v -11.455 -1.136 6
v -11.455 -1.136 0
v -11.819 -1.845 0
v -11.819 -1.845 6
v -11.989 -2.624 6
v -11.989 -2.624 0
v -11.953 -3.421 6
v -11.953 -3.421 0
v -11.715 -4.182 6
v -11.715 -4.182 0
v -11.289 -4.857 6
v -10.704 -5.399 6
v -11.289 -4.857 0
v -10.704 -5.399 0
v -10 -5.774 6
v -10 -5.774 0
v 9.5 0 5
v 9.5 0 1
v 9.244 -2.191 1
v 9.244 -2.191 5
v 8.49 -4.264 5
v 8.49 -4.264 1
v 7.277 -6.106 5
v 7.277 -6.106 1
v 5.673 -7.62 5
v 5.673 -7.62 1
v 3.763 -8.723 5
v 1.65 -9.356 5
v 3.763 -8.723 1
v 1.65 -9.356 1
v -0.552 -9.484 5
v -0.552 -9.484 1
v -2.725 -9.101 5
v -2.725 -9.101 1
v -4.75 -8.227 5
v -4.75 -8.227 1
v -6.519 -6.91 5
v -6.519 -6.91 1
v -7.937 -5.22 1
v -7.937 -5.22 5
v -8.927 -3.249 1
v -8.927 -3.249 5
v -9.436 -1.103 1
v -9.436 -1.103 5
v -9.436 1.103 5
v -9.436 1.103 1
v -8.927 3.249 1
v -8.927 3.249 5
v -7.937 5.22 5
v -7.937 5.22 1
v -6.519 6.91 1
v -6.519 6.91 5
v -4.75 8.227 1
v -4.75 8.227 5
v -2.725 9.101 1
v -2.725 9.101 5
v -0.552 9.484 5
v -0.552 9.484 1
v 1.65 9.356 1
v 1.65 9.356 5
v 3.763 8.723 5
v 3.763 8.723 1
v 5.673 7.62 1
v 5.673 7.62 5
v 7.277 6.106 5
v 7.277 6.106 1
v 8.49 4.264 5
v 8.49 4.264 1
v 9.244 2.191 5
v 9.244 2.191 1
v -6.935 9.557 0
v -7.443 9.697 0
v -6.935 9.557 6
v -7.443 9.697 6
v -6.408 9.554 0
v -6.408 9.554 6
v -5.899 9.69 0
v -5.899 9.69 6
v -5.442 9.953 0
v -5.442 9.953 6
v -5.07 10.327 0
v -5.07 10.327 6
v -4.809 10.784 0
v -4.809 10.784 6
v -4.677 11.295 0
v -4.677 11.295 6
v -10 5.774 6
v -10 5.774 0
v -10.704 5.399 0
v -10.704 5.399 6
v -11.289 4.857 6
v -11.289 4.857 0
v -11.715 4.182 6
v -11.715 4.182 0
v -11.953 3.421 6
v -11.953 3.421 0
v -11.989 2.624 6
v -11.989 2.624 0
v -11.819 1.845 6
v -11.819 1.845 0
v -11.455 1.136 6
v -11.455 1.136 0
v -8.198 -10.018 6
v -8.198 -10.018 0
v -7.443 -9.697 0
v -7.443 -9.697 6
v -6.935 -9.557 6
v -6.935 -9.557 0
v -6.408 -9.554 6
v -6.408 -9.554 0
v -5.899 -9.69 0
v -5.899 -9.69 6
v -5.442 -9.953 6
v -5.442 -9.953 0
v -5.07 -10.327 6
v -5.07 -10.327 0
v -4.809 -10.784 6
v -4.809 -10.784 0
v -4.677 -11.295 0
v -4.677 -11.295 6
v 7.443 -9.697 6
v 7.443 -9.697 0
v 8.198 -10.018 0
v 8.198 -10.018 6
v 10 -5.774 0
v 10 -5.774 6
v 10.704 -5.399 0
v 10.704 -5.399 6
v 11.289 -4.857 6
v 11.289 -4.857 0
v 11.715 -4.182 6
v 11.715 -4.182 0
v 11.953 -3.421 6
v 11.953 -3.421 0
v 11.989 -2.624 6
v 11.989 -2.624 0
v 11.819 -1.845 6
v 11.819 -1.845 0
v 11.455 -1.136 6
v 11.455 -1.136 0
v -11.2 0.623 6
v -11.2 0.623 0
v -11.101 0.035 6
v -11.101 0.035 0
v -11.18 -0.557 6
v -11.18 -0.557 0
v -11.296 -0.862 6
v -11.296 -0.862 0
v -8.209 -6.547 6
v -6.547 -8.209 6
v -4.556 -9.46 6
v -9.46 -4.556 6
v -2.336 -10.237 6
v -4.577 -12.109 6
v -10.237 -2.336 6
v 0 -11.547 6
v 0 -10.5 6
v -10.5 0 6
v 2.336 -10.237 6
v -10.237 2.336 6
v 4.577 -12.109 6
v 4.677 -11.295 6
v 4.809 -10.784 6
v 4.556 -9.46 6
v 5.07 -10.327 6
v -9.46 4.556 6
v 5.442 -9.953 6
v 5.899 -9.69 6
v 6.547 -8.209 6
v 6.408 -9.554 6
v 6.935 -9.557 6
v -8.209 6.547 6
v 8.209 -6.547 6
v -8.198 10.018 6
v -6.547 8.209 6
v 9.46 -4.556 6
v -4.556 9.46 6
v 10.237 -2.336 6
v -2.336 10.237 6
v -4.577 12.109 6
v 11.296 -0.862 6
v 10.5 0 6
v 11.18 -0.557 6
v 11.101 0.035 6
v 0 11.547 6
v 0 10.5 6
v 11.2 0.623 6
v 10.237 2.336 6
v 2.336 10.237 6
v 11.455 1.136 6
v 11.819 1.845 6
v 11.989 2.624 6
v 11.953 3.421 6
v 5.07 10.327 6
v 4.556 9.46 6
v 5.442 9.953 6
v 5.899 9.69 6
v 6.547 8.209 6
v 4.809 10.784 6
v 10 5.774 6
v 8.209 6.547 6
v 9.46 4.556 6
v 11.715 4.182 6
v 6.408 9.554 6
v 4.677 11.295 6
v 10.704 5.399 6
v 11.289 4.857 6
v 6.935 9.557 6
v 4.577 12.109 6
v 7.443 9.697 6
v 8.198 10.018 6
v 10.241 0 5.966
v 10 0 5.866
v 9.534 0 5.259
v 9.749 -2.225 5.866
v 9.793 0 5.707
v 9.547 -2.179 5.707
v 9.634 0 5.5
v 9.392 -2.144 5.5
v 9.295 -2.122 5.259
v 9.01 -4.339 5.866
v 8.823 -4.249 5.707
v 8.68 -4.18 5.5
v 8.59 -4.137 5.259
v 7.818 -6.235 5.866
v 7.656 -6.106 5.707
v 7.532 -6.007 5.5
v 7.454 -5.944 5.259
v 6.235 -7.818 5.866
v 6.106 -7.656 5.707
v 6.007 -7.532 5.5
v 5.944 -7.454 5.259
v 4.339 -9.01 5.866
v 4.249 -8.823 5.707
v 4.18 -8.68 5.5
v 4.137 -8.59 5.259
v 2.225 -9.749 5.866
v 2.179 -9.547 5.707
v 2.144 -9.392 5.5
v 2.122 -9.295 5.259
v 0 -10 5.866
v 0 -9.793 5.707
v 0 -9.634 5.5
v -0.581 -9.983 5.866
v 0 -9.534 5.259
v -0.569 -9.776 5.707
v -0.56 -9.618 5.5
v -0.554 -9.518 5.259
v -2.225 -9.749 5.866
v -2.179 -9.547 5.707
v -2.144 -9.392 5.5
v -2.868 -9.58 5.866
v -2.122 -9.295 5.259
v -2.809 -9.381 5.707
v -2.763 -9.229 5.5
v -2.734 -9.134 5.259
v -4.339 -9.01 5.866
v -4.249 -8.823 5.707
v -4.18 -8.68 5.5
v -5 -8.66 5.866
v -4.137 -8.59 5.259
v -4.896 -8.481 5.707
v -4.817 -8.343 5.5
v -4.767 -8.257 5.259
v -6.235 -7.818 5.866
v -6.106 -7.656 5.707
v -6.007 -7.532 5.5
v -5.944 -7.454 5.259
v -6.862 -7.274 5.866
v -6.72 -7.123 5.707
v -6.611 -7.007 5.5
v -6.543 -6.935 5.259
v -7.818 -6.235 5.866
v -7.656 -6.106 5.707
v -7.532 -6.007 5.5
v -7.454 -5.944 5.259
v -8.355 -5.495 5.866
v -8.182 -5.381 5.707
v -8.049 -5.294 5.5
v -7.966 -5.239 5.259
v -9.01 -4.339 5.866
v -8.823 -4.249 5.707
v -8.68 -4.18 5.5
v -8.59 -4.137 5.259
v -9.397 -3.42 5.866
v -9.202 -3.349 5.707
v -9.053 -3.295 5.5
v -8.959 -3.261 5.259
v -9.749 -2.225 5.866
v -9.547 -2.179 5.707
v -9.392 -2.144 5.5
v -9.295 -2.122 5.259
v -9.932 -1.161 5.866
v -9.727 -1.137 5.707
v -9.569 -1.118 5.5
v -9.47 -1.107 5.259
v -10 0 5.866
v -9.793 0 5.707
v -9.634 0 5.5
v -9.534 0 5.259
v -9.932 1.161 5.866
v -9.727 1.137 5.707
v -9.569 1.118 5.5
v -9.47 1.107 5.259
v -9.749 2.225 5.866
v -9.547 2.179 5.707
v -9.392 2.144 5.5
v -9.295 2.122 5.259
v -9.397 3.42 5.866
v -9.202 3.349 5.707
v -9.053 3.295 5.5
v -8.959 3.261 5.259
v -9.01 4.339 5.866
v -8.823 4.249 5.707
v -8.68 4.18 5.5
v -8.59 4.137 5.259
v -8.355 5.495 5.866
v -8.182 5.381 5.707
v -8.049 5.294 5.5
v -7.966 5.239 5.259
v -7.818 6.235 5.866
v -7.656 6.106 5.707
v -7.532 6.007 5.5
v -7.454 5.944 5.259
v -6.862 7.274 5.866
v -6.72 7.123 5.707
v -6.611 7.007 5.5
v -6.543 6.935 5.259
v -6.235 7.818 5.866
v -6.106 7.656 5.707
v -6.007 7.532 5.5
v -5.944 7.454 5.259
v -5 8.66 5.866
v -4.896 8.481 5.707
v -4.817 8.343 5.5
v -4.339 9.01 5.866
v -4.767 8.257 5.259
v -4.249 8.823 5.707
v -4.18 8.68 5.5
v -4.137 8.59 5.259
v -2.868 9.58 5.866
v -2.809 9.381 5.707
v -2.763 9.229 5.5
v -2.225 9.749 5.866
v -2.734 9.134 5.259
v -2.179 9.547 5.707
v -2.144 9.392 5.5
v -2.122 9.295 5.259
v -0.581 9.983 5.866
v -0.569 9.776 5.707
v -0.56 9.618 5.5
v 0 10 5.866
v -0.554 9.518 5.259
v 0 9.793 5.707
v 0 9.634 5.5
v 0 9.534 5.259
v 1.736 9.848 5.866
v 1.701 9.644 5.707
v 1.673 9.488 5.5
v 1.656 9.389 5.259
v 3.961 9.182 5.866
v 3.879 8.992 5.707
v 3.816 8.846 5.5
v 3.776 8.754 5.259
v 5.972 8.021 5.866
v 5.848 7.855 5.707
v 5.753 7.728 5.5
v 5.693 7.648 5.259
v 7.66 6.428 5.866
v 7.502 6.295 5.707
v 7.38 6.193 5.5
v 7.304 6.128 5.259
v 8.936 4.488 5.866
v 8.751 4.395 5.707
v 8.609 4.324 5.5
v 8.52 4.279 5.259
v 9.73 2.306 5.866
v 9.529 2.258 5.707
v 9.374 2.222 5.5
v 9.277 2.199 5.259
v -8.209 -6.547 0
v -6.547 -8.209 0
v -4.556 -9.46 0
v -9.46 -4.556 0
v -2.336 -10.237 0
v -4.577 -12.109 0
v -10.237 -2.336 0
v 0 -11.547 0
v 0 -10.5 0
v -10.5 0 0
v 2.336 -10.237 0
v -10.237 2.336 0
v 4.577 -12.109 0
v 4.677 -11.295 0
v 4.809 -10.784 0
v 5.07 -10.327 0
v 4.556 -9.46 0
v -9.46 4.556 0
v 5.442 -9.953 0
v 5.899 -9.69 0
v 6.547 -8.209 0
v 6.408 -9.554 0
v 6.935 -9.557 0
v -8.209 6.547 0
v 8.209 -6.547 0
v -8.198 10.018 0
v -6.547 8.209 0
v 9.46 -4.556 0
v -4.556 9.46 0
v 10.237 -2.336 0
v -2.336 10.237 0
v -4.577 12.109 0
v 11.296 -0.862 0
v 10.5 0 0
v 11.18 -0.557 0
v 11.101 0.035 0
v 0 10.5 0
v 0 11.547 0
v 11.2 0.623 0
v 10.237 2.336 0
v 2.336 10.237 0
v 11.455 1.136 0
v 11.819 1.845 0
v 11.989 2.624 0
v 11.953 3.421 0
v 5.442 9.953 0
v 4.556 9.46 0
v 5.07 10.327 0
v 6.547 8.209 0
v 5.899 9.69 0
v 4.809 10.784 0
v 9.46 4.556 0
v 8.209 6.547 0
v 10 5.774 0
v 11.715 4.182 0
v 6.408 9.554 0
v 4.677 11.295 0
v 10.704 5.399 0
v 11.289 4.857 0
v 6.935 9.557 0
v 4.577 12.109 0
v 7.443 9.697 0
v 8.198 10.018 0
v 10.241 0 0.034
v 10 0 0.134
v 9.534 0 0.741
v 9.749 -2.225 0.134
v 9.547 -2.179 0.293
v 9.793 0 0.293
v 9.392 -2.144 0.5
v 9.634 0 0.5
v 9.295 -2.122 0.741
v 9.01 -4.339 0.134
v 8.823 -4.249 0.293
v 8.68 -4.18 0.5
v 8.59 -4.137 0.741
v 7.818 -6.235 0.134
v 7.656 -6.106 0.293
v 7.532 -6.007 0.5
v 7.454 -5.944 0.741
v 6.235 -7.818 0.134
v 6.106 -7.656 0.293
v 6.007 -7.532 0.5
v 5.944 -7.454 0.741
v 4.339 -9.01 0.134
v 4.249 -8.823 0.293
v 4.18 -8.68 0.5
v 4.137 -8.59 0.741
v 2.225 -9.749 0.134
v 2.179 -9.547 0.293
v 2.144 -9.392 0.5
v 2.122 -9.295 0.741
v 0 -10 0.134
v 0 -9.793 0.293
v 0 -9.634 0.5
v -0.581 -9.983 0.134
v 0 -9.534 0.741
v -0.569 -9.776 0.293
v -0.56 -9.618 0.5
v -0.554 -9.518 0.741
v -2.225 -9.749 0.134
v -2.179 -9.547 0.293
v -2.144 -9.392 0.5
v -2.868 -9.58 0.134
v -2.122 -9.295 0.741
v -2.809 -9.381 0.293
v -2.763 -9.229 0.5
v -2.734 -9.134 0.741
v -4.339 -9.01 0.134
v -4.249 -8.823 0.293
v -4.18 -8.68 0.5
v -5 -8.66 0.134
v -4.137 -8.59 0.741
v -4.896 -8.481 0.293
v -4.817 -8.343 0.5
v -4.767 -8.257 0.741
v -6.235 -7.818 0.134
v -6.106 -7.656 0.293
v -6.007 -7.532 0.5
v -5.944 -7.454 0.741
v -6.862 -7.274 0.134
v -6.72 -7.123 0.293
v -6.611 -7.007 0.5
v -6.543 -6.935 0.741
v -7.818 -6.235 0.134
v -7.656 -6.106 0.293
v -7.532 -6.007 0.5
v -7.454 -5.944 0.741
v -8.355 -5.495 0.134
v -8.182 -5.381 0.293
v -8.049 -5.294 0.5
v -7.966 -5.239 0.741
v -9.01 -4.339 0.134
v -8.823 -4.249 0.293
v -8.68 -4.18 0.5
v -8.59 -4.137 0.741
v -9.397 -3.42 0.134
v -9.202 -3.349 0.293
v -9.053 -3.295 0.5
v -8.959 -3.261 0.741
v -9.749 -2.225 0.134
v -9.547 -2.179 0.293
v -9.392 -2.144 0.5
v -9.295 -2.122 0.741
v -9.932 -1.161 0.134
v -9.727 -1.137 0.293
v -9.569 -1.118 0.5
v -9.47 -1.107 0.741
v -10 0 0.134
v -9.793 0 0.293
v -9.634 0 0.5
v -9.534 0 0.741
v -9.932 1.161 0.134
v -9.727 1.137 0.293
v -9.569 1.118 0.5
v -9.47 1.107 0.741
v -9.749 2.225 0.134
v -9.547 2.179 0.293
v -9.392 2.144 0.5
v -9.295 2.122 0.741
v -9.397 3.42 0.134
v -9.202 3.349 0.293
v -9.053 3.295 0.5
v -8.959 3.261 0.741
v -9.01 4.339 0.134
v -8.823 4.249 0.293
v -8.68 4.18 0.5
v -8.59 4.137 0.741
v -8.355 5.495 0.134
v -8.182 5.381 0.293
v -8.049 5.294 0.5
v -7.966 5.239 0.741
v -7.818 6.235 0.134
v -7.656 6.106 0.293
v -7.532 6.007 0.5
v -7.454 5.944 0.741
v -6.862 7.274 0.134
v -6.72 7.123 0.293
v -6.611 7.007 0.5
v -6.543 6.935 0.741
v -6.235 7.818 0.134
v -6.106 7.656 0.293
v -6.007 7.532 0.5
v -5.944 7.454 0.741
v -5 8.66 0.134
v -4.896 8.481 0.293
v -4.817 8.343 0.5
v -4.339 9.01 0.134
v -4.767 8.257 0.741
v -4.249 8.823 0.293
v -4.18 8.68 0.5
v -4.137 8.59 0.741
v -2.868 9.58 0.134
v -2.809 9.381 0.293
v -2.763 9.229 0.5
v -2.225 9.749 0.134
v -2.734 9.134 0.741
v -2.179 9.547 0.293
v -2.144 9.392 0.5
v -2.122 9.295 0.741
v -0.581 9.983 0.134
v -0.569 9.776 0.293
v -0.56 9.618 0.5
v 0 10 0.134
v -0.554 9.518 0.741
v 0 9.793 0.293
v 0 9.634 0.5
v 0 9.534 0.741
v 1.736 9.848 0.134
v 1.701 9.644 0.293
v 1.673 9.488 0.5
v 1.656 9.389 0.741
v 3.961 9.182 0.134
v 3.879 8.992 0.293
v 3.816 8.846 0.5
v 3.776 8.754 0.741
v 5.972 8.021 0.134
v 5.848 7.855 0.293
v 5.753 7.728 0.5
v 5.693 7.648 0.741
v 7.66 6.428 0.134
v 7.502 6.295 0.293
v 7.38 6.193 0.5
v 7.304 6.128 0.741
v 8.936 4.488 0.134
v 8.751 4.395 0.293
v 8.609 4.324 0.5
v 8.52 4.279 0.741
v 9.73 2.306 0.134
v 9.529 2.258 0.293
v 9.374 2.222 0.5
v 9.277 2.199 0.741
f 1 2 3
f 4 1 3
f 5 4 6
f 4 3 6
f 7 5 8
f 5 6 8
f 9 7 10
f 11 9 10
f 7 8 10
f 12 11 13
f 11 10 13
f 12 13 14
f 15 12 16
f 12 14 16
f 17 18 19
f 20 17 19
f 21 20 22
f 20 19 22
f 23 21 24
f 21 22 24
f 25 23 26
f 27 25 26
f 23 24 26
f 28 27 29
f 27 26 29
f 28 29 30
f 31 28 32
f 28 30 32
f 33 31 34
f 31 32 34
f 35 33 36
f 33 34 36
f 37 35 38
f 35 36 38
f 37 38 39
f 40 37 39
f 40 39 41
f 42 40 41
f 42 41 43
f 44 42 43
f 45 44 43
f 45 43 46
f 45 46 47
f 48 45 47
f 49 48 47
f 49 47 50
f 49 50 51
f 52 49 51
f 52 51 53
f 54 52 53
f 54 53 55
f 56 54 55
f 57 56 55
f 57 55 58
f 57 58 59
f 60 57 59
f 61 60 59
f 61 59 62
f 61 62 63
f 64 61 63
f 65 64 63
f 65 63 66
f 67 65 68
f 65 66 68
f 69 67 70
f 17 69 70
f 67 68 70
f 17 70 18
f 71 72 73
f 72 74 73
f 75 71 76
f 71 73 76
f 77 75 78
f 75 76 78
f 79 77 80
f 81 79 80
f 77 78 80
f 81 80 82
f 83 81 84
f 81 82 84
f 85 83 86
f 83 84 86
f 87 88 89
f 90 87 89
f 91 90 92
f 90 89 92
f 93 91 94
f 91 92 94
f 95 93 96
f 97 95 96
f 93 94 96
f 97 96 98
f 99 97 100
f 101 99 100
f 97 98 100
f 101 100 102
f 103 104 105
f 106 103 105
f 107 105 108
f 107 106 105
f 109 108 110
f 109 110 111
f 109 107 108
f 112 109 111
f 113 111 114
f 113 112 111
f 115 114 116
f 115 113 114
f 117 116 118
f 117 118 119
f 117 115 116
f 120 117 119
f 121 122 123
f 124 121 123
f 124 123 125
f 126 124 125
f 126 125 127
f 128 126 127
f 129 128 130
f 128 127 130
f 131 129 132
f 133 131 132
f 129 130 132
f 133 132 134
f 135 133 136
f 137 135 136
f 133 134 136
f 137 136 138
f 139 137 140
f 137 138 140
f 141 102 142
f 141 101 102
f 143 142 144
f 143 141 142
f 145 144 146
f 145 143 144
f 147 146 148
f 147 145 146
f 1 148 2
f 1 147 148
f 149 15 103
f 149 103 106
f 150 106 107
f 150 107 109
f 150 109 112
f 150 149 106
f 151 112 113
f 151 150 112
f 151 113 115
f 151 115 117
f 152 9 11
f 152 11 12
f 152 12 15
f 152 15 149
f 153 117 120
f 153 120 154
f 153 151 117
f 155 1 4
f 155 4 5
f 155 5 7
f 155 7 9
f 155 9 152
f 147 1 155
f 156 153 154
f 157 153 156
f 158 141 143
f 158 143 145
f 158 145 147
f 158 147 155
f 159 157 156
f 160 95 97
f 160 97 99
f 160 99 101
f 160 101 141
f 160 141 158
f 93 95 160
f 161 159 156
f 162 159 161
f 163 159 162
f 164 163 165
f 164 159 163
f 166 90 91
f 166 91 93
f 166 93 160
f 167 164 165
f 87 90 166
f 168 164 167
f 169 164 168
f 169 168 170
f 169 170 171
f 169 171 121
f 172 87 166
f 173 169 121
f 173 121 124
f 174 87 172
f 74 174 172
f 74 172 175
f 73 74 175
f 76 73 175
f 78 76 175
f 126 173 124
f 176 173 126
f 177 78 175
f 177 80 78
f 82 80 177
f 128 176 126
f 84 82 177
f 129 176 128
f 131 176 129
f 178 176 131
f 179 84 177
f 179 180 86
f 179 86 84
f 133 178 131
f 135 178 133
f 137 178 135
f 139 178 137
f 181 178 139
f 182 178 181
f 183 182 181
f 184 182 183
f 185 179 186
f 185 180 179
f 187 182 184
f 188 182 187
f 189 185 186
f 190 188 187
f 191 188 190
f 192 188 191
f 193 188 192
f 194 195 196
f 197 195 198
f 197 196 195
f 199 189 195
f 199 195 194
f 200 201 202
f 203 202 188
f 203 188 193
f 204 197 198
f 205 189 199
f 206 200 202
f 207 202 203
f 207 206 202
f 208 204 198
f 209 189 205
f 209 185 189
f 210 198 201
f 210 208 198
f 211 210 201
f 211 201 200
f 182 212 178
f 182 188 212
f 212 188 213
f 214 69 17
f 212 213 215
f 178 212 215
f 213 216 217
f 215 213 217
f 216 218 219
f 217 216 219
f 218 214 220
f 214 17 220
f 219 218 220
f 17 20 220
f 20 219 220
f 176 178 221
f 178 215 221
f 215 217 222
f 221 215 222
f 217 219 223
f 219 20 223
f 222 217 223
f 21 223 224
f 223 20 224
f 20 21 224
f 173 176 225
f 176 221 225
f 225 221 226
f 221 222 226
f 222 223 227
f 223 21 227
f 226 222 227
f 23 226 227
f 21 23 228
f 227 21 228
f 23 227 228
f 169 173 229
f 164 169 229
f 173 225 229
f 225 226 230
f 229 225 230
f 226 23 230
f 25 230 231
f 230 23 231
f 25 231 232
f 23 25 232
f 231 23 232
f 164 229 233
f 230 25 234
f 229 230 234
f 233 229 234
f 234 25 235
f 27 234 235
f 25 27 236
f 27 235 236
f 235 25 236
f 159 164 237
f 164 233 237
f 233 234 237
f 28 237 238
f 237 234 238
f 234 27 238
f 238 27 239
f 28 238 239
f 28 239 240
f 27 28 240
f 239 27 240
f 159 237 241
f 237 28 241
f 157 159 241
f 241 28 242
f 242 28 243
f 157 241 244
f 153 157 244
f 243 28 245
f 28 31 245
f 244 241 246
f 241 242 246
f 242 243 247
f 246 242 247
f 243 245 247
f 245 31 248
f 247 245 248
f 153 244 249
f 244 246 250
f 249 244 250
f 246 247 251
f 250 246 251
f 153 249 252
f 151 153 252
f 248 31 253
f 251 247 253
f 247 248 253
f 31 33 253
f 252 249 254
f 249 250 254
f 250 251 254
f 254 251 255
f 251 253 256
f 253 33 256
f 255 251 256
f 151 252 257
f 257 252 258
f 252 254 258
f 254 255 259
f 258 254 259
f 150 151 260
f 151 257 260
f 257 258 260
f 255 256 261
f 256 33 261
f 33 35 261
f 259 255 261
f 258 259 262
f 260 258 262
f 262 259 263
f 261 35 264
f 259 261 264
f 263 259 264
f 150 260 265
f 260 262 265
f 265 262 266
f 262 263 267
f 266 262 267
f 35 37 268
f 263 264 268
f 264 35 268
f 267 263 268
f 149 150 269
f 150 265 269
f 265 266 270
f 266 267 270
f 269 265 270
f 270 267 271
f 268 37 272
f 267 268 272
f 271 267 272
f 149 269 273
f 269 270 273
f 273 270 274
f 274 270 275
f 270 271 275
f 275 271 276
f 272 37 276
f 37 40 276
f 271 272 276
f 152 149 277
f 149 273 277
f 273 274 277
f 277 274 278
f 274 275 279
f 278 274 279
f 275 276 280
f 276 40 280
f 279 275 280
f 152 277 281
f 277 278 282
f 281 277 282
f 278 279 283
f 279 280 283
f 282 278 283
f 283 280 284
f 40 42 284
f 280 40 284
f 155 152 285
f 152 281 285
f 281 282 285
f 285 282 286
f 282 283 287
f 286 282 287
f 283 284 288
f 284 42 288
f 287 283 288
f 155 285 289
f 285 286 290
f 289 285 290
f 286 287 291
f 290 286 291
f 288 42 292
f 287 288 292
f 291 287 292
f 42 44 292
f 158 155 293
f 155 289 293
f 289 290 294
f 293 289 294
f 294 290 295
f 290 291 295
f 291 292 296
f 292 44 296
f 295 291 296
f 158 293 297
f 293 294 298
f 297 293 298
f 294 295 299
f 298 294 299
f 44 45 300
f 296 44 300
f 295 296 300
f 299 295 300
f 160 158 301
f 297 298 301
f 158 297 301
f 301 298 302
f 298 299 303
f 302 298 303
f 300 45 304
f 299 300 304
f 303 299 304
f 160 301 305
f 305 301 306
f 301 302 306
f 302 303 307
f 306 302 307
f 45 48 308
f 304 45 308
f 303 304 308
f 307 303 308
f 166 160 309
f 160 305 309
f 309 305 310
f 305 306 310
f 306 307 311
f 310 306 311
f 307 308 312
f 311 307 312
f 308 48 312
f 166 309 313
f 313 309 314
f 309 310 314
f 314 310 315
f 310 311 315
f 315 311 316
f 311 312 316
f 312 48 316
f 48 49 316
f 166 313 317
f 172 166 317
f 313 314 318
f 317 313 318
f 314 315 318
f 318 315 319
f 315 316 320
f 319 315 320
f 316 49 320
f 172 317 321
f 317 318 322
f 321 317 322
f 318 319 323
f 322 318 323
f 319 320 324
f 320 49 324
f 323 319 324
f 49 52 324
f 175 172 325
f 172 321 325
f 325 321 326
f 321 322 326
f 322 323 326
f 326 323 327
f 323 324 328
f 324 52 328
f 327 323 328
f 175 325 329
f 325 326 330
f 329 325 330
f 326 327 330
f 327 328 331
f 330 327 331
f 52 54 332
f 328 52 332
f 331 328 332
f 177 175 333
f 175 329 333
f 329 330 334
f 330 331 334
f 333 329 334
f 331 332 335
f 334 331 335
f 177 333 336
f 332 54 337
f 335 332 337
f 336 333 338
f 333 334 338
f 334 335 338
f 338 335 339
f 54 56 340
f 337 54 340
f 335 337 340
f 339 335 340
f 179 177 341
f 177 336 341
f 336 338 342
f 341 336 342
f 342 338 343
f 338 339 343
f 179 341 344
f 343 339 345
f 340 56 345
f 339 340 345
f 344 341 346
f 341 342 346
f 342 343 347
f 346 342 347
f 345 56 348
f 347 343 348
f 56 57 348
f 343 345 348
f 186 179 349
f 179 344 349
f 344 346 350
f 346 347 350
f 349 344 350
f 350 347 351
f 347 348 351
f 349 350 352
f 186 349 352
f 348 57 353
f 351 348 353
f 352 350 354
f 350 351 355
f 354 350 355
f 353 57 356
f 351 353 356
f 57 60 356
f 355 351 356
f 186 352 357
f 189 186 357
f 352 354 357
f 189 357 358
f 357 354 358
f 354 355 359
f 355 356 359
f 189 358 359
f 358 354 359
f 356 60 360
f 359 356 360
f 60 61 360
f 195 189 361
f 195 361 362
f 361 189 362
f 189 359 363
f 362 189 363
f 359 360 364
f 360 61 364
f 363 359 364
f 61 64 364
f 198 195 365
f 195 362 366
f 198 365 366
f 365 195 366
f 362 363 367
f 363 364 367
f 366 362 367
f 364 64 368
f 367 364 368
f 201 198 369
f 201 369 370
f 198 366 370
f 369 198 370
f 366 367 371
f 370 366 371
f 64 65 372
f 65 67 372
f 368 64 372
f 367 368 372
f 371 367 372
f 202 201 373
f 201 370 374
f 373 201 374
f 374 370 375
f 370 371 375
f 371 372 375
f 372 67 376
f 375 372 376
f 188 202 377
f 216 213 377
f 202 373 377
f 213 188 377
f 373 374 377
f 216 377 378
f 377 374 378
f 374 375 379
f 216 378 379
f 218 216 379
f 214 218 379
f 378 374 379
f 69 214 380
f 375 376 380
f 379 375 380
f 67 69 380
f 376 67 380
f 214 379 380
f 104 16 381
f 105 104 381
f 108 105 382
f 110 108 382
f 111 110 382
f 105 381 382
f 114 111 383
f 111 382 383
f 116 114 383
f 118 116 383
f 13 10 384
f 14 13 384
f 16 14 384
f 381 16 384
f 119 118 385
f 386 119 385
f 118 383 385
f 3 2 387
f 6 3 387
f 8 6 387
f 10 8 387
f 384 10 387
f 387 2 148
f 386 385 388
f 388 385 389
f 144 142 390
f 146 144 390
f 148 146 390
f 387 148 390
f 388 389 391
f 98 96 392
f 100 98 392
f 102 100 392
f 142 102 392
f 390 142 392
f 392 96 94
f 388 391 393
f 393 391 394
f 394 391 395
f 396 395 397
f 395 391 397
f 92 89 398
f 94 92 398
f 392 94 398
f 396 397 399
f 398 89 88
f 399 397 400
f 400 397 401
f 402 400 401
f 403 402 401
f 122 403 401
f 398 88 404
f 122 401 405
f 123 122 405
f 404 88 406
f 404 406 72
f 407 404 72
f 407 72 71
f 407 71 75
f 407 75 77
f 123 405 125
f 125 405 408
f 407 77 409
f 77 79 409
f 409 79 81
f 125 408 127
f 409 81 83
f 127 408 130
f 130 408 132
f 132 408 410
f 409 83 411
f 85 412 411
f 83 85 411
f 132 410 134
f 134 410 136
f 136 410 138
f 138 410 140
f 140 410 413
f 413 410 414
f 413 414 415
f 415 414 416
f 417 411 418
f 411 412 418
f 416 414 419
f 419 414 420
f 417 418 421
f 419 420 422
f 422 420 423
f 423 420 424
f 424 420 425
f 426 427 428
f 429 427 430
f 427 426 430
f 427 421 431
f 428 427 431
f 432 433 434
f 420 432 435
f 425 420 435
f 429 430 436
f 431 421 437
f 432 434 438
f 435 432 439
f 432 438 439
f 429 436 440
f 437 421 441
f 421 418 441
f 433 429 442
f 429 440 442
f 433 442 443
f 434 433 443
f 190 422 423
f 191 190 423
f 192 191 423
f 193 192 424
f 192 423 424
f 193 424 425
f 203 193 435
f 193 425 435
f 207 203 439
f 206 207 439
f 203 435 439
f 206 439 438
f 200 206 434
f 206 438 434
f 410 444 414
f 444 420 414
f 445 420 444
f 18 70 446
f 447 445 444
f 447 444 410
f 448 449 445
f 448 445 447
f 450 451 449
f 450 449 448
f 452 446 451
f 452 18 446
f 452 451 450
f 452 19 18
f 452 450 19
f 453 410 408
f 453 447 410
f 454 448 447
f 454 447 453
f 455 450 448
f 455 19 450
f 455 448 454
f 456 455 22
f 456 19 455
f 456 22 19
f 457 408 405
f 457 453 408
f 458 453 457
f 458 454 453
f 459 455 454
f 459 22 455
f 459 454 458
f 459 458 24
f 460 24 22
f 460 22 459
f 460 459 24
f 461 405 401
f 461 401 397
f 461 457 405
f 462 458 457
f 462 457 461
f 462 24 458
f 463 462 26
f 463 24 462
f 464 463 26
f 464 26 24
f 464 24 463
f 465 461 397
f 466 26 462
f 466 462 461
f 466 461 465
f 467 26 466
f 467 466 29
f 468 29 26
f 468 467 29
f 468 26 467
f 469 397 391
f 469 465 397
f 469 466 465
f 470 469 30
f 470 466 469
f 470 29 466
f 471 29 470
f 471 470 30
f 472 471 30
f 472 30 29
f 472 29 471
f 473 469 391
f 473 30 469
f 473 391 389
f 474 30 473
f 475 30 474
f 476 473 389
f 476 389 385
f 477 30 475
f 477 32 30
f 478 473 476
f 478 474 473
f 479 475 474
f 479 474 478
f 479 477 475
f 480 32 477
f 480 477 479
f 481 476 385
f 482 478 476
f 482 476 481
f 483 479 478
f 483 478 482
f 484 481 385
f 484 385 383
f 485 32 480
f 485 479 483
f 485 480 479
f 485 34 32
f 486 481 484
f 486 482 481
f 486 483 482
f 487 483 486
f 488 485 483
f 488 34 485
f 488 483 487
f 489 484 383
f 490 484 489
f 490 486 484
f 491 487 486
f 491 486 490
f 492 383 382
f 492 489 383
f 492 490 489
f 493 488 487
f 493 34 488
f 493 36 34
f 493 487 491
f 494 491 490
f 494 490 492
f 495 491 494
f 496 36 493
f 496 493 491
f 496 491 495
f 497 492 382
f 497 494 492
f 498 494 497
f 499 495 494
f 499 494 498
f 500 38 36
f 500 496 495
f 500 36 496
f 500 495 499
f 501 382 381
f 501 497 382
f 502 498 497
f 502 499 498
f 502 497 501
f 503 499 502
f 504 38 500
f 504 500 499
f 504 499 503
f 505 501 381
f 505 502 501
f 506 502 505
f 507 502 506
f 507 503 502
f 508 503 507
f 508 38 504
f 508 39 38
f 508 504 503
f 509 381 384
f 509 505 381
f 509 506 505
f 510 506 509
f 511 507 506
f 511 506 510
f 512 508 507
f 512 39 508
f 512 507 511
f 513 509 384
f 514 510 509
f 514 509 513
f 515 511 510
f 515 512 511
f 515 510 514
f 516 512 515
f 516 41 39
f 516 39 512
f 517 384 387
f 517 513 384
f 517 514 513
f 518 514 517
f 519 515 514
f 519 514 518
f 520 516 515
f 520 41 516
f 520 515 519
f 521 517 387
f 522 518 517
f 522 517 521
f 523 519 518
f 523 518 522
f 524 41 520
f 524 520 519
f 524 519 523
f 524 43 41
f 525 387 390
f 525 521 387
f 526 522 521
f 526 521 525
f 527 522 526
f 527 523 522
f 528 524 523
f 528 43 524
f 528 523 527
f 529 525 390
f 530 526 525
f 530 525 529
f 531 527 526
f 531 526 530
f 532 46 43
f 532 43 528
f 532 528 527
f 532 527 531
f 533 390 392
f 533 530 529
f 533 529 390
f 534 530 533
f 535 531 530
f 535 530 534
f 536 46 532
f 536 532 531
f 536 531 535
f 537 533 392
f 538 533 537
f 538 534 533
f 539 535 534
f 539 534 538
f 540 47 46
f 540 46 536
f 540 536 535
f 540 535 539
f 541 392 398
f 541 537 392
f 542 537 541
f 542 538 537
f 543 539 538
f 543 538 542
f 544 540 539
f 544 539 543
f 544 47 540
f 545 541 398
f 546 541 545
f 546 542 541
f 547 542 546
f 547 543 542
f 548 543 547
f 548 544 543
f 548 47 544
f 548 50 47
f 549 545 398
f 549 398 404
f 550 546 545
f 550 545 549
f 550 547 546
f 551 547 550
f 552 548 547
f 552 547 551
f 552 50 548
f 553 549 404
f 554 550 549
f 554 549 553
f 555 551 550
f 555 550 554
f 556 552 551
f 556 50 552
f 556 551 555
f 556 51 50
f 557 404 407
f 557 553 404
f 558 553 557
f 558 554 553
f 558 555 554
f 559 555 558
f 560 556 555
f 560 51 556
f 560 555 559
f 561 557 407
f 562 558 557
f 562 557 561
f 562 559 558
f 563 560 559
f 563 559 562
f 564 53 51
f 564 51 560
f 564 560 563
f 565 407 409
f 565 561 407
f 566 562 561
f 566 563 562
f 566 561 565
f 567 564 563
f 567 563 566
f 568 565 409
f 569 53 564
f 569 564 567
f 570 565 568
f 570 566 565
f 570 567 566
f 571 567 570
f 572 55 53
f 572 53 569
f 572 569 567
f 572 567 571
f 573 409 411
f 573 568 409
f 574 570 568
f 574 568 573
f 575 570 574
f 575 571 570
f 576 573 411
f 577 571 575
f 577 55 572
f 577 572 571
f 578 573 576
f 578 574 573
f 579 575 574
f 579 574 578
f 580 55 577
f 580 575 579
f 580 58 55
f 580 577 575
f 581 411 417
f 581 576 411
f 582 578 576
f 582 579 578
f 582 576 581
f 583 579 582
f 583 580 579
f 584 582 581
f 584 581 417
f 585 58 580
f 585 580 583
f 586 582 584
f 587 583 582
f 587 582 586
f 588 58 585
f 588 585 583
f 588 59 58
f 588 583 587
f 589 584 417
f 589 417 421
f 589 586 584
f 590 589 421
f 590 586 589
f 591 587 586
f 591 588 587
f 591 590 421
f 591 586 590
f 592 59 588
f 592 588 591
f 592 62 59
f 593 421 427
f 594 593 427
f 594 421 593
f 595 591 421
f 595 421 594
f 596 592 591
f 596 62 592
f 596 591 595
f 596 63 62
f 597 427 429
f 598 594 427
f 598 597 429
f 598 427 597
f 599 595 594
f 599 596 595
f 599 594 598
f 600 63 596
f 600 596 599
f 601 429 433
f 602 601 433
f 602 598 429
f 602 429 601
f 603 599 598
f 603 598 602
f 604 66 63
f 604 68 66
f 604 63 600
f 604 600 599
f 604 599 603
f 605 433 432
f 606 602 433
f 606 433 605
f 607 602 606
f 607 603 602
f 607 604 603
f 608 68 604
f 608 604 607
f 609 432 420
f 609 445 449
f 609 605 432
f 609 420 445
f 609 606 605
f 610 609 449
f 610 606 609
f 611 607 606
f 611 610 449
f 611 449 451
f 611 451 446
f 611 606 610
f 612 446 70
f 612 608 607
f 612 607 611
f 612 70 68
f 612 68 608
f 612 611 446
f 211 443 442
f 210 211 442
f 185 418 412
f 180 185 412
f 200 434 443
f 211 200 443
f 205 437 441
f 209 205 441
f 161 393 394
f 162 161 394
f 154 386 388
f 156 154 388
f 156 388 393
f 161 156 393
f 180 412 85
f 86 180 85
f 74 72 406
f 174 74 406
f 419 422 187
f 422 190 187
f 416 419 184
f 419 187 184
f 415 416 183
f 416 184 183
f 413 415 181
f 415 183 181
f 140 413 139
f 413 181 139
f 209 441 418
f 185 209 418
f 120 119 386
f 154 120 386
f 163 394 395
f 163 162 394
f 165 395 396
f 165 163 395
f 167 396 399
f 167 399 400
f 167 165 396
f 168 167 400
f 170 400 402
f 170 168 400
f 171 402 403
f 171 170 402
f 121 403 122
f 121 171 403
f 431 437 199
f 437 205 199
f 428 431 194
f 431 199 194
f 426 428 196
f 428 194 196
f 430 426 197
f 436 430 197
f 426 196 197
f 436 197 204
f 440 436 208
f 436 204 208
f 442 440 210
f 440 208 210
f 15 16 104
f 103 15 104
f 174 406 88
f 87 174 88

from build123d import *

# Parameters (mm, degrees)
F1_DEPTH = 6
F2_R     = 9.5
F3_DEPTH = 7
F4_R     = 2
F5_R     = 1


with BuildPart() as f1:
    # F0 (on Top) → F1 (new body)
    with BuildSketch(Plane.XY):
        Polygon((-8.198368, 10.017881), (-10, 5.773503), (-5, 8.660254), align=None)
        with BuildLine():
            ThreePointArc((-10, 5.773503), (-12, 2.886751), (-10, 0))
            Line((-10, 0), (-10, 5.773503))
        make_face()
        with BuildLine():
            ThreePointArc((-10, 0), (-12, -2.886751), (-10, -5.773503))
            Line((-10, -5.773503), (-10, 0))
        make_face()
        Polygon((-4.576555, 12.108936), (-5, 8.660254), (0, 11.547005), align=None)
        Polygon((4.576555, 12.108936), (0, 11.547005), (5, 8.660254), align=None)
        Polygon((0, -11.547005), (-5, -8.660254), (-4.576555, -12.108936), align=None)
        Polygon((8.198368, 10.017881), (5, 8.660254), (10, 5.773503), align=None)
        with BuildLine():
            Line((10, 0), (10, -5.773503))
            ThreePointArc((10, -5.773503), (12, -2.886751), (10, 0))
        make_face()
        with BuildLine():
            Line((10, 5.773503), (10, 0))
            ThreePointArc((10, 0), (12, 2.886751), (10, 5.773503))
        make_face()
        Polygon((-5, -8.660254), (-10, -5.773503), (-8.198368, -10.017881), align=None)
        Polygon((5, -8.660254), (0, -11.547005), (4.576555, -12.108936), align=None)
        Polygon((10, -5.773503), (5, -8.660254), (8.198368, -10.017881), align=None)
        Polygon((-10, 0), (-10, -5.773503), (-5, -8.660254), (0, -11.547005), (5, -8.660254), (10, -5.773503), (10, 0), (10, 5.773503), (5, 8.660254), (0, 11.547005), (-5, 8.660254), (-10, 5.773503), align=None)
    extrude(amount=F1_DEPTH)

    # F2 (on face) → F3 (cut)
    with BuildSketch(Plane(origin=(0, 0, 0), x_dir=(1, 0, 0), z_dir=(0, 0, -1))):
        Circle(F2_R)
    extrude(amount=-F3_DEPTH, mode=Mode.SUBTRACT)

    # F4
    f4_edges = [f1.edges().sort_by_distance(p)[0] for p in [
        (5, 8.660254, 3),
        (-5, 8.660254, 3),
        (5, -8.660254, 3),
        (-5, -8.660254, 3),
        (10, 0, 3),
        (-10, 0, 3),
    ]]
    fillet(f4_edges, radius=F4_R)

    # F5
    f5_edges = [f1.edges().sort_by_distance(p)[0] for p in [
        (-9.5, 0, 6),
        (-9.5, 0, 0),
    ]]
    fillet(f5_edges, radius=F5_R)


solid = f1.part
